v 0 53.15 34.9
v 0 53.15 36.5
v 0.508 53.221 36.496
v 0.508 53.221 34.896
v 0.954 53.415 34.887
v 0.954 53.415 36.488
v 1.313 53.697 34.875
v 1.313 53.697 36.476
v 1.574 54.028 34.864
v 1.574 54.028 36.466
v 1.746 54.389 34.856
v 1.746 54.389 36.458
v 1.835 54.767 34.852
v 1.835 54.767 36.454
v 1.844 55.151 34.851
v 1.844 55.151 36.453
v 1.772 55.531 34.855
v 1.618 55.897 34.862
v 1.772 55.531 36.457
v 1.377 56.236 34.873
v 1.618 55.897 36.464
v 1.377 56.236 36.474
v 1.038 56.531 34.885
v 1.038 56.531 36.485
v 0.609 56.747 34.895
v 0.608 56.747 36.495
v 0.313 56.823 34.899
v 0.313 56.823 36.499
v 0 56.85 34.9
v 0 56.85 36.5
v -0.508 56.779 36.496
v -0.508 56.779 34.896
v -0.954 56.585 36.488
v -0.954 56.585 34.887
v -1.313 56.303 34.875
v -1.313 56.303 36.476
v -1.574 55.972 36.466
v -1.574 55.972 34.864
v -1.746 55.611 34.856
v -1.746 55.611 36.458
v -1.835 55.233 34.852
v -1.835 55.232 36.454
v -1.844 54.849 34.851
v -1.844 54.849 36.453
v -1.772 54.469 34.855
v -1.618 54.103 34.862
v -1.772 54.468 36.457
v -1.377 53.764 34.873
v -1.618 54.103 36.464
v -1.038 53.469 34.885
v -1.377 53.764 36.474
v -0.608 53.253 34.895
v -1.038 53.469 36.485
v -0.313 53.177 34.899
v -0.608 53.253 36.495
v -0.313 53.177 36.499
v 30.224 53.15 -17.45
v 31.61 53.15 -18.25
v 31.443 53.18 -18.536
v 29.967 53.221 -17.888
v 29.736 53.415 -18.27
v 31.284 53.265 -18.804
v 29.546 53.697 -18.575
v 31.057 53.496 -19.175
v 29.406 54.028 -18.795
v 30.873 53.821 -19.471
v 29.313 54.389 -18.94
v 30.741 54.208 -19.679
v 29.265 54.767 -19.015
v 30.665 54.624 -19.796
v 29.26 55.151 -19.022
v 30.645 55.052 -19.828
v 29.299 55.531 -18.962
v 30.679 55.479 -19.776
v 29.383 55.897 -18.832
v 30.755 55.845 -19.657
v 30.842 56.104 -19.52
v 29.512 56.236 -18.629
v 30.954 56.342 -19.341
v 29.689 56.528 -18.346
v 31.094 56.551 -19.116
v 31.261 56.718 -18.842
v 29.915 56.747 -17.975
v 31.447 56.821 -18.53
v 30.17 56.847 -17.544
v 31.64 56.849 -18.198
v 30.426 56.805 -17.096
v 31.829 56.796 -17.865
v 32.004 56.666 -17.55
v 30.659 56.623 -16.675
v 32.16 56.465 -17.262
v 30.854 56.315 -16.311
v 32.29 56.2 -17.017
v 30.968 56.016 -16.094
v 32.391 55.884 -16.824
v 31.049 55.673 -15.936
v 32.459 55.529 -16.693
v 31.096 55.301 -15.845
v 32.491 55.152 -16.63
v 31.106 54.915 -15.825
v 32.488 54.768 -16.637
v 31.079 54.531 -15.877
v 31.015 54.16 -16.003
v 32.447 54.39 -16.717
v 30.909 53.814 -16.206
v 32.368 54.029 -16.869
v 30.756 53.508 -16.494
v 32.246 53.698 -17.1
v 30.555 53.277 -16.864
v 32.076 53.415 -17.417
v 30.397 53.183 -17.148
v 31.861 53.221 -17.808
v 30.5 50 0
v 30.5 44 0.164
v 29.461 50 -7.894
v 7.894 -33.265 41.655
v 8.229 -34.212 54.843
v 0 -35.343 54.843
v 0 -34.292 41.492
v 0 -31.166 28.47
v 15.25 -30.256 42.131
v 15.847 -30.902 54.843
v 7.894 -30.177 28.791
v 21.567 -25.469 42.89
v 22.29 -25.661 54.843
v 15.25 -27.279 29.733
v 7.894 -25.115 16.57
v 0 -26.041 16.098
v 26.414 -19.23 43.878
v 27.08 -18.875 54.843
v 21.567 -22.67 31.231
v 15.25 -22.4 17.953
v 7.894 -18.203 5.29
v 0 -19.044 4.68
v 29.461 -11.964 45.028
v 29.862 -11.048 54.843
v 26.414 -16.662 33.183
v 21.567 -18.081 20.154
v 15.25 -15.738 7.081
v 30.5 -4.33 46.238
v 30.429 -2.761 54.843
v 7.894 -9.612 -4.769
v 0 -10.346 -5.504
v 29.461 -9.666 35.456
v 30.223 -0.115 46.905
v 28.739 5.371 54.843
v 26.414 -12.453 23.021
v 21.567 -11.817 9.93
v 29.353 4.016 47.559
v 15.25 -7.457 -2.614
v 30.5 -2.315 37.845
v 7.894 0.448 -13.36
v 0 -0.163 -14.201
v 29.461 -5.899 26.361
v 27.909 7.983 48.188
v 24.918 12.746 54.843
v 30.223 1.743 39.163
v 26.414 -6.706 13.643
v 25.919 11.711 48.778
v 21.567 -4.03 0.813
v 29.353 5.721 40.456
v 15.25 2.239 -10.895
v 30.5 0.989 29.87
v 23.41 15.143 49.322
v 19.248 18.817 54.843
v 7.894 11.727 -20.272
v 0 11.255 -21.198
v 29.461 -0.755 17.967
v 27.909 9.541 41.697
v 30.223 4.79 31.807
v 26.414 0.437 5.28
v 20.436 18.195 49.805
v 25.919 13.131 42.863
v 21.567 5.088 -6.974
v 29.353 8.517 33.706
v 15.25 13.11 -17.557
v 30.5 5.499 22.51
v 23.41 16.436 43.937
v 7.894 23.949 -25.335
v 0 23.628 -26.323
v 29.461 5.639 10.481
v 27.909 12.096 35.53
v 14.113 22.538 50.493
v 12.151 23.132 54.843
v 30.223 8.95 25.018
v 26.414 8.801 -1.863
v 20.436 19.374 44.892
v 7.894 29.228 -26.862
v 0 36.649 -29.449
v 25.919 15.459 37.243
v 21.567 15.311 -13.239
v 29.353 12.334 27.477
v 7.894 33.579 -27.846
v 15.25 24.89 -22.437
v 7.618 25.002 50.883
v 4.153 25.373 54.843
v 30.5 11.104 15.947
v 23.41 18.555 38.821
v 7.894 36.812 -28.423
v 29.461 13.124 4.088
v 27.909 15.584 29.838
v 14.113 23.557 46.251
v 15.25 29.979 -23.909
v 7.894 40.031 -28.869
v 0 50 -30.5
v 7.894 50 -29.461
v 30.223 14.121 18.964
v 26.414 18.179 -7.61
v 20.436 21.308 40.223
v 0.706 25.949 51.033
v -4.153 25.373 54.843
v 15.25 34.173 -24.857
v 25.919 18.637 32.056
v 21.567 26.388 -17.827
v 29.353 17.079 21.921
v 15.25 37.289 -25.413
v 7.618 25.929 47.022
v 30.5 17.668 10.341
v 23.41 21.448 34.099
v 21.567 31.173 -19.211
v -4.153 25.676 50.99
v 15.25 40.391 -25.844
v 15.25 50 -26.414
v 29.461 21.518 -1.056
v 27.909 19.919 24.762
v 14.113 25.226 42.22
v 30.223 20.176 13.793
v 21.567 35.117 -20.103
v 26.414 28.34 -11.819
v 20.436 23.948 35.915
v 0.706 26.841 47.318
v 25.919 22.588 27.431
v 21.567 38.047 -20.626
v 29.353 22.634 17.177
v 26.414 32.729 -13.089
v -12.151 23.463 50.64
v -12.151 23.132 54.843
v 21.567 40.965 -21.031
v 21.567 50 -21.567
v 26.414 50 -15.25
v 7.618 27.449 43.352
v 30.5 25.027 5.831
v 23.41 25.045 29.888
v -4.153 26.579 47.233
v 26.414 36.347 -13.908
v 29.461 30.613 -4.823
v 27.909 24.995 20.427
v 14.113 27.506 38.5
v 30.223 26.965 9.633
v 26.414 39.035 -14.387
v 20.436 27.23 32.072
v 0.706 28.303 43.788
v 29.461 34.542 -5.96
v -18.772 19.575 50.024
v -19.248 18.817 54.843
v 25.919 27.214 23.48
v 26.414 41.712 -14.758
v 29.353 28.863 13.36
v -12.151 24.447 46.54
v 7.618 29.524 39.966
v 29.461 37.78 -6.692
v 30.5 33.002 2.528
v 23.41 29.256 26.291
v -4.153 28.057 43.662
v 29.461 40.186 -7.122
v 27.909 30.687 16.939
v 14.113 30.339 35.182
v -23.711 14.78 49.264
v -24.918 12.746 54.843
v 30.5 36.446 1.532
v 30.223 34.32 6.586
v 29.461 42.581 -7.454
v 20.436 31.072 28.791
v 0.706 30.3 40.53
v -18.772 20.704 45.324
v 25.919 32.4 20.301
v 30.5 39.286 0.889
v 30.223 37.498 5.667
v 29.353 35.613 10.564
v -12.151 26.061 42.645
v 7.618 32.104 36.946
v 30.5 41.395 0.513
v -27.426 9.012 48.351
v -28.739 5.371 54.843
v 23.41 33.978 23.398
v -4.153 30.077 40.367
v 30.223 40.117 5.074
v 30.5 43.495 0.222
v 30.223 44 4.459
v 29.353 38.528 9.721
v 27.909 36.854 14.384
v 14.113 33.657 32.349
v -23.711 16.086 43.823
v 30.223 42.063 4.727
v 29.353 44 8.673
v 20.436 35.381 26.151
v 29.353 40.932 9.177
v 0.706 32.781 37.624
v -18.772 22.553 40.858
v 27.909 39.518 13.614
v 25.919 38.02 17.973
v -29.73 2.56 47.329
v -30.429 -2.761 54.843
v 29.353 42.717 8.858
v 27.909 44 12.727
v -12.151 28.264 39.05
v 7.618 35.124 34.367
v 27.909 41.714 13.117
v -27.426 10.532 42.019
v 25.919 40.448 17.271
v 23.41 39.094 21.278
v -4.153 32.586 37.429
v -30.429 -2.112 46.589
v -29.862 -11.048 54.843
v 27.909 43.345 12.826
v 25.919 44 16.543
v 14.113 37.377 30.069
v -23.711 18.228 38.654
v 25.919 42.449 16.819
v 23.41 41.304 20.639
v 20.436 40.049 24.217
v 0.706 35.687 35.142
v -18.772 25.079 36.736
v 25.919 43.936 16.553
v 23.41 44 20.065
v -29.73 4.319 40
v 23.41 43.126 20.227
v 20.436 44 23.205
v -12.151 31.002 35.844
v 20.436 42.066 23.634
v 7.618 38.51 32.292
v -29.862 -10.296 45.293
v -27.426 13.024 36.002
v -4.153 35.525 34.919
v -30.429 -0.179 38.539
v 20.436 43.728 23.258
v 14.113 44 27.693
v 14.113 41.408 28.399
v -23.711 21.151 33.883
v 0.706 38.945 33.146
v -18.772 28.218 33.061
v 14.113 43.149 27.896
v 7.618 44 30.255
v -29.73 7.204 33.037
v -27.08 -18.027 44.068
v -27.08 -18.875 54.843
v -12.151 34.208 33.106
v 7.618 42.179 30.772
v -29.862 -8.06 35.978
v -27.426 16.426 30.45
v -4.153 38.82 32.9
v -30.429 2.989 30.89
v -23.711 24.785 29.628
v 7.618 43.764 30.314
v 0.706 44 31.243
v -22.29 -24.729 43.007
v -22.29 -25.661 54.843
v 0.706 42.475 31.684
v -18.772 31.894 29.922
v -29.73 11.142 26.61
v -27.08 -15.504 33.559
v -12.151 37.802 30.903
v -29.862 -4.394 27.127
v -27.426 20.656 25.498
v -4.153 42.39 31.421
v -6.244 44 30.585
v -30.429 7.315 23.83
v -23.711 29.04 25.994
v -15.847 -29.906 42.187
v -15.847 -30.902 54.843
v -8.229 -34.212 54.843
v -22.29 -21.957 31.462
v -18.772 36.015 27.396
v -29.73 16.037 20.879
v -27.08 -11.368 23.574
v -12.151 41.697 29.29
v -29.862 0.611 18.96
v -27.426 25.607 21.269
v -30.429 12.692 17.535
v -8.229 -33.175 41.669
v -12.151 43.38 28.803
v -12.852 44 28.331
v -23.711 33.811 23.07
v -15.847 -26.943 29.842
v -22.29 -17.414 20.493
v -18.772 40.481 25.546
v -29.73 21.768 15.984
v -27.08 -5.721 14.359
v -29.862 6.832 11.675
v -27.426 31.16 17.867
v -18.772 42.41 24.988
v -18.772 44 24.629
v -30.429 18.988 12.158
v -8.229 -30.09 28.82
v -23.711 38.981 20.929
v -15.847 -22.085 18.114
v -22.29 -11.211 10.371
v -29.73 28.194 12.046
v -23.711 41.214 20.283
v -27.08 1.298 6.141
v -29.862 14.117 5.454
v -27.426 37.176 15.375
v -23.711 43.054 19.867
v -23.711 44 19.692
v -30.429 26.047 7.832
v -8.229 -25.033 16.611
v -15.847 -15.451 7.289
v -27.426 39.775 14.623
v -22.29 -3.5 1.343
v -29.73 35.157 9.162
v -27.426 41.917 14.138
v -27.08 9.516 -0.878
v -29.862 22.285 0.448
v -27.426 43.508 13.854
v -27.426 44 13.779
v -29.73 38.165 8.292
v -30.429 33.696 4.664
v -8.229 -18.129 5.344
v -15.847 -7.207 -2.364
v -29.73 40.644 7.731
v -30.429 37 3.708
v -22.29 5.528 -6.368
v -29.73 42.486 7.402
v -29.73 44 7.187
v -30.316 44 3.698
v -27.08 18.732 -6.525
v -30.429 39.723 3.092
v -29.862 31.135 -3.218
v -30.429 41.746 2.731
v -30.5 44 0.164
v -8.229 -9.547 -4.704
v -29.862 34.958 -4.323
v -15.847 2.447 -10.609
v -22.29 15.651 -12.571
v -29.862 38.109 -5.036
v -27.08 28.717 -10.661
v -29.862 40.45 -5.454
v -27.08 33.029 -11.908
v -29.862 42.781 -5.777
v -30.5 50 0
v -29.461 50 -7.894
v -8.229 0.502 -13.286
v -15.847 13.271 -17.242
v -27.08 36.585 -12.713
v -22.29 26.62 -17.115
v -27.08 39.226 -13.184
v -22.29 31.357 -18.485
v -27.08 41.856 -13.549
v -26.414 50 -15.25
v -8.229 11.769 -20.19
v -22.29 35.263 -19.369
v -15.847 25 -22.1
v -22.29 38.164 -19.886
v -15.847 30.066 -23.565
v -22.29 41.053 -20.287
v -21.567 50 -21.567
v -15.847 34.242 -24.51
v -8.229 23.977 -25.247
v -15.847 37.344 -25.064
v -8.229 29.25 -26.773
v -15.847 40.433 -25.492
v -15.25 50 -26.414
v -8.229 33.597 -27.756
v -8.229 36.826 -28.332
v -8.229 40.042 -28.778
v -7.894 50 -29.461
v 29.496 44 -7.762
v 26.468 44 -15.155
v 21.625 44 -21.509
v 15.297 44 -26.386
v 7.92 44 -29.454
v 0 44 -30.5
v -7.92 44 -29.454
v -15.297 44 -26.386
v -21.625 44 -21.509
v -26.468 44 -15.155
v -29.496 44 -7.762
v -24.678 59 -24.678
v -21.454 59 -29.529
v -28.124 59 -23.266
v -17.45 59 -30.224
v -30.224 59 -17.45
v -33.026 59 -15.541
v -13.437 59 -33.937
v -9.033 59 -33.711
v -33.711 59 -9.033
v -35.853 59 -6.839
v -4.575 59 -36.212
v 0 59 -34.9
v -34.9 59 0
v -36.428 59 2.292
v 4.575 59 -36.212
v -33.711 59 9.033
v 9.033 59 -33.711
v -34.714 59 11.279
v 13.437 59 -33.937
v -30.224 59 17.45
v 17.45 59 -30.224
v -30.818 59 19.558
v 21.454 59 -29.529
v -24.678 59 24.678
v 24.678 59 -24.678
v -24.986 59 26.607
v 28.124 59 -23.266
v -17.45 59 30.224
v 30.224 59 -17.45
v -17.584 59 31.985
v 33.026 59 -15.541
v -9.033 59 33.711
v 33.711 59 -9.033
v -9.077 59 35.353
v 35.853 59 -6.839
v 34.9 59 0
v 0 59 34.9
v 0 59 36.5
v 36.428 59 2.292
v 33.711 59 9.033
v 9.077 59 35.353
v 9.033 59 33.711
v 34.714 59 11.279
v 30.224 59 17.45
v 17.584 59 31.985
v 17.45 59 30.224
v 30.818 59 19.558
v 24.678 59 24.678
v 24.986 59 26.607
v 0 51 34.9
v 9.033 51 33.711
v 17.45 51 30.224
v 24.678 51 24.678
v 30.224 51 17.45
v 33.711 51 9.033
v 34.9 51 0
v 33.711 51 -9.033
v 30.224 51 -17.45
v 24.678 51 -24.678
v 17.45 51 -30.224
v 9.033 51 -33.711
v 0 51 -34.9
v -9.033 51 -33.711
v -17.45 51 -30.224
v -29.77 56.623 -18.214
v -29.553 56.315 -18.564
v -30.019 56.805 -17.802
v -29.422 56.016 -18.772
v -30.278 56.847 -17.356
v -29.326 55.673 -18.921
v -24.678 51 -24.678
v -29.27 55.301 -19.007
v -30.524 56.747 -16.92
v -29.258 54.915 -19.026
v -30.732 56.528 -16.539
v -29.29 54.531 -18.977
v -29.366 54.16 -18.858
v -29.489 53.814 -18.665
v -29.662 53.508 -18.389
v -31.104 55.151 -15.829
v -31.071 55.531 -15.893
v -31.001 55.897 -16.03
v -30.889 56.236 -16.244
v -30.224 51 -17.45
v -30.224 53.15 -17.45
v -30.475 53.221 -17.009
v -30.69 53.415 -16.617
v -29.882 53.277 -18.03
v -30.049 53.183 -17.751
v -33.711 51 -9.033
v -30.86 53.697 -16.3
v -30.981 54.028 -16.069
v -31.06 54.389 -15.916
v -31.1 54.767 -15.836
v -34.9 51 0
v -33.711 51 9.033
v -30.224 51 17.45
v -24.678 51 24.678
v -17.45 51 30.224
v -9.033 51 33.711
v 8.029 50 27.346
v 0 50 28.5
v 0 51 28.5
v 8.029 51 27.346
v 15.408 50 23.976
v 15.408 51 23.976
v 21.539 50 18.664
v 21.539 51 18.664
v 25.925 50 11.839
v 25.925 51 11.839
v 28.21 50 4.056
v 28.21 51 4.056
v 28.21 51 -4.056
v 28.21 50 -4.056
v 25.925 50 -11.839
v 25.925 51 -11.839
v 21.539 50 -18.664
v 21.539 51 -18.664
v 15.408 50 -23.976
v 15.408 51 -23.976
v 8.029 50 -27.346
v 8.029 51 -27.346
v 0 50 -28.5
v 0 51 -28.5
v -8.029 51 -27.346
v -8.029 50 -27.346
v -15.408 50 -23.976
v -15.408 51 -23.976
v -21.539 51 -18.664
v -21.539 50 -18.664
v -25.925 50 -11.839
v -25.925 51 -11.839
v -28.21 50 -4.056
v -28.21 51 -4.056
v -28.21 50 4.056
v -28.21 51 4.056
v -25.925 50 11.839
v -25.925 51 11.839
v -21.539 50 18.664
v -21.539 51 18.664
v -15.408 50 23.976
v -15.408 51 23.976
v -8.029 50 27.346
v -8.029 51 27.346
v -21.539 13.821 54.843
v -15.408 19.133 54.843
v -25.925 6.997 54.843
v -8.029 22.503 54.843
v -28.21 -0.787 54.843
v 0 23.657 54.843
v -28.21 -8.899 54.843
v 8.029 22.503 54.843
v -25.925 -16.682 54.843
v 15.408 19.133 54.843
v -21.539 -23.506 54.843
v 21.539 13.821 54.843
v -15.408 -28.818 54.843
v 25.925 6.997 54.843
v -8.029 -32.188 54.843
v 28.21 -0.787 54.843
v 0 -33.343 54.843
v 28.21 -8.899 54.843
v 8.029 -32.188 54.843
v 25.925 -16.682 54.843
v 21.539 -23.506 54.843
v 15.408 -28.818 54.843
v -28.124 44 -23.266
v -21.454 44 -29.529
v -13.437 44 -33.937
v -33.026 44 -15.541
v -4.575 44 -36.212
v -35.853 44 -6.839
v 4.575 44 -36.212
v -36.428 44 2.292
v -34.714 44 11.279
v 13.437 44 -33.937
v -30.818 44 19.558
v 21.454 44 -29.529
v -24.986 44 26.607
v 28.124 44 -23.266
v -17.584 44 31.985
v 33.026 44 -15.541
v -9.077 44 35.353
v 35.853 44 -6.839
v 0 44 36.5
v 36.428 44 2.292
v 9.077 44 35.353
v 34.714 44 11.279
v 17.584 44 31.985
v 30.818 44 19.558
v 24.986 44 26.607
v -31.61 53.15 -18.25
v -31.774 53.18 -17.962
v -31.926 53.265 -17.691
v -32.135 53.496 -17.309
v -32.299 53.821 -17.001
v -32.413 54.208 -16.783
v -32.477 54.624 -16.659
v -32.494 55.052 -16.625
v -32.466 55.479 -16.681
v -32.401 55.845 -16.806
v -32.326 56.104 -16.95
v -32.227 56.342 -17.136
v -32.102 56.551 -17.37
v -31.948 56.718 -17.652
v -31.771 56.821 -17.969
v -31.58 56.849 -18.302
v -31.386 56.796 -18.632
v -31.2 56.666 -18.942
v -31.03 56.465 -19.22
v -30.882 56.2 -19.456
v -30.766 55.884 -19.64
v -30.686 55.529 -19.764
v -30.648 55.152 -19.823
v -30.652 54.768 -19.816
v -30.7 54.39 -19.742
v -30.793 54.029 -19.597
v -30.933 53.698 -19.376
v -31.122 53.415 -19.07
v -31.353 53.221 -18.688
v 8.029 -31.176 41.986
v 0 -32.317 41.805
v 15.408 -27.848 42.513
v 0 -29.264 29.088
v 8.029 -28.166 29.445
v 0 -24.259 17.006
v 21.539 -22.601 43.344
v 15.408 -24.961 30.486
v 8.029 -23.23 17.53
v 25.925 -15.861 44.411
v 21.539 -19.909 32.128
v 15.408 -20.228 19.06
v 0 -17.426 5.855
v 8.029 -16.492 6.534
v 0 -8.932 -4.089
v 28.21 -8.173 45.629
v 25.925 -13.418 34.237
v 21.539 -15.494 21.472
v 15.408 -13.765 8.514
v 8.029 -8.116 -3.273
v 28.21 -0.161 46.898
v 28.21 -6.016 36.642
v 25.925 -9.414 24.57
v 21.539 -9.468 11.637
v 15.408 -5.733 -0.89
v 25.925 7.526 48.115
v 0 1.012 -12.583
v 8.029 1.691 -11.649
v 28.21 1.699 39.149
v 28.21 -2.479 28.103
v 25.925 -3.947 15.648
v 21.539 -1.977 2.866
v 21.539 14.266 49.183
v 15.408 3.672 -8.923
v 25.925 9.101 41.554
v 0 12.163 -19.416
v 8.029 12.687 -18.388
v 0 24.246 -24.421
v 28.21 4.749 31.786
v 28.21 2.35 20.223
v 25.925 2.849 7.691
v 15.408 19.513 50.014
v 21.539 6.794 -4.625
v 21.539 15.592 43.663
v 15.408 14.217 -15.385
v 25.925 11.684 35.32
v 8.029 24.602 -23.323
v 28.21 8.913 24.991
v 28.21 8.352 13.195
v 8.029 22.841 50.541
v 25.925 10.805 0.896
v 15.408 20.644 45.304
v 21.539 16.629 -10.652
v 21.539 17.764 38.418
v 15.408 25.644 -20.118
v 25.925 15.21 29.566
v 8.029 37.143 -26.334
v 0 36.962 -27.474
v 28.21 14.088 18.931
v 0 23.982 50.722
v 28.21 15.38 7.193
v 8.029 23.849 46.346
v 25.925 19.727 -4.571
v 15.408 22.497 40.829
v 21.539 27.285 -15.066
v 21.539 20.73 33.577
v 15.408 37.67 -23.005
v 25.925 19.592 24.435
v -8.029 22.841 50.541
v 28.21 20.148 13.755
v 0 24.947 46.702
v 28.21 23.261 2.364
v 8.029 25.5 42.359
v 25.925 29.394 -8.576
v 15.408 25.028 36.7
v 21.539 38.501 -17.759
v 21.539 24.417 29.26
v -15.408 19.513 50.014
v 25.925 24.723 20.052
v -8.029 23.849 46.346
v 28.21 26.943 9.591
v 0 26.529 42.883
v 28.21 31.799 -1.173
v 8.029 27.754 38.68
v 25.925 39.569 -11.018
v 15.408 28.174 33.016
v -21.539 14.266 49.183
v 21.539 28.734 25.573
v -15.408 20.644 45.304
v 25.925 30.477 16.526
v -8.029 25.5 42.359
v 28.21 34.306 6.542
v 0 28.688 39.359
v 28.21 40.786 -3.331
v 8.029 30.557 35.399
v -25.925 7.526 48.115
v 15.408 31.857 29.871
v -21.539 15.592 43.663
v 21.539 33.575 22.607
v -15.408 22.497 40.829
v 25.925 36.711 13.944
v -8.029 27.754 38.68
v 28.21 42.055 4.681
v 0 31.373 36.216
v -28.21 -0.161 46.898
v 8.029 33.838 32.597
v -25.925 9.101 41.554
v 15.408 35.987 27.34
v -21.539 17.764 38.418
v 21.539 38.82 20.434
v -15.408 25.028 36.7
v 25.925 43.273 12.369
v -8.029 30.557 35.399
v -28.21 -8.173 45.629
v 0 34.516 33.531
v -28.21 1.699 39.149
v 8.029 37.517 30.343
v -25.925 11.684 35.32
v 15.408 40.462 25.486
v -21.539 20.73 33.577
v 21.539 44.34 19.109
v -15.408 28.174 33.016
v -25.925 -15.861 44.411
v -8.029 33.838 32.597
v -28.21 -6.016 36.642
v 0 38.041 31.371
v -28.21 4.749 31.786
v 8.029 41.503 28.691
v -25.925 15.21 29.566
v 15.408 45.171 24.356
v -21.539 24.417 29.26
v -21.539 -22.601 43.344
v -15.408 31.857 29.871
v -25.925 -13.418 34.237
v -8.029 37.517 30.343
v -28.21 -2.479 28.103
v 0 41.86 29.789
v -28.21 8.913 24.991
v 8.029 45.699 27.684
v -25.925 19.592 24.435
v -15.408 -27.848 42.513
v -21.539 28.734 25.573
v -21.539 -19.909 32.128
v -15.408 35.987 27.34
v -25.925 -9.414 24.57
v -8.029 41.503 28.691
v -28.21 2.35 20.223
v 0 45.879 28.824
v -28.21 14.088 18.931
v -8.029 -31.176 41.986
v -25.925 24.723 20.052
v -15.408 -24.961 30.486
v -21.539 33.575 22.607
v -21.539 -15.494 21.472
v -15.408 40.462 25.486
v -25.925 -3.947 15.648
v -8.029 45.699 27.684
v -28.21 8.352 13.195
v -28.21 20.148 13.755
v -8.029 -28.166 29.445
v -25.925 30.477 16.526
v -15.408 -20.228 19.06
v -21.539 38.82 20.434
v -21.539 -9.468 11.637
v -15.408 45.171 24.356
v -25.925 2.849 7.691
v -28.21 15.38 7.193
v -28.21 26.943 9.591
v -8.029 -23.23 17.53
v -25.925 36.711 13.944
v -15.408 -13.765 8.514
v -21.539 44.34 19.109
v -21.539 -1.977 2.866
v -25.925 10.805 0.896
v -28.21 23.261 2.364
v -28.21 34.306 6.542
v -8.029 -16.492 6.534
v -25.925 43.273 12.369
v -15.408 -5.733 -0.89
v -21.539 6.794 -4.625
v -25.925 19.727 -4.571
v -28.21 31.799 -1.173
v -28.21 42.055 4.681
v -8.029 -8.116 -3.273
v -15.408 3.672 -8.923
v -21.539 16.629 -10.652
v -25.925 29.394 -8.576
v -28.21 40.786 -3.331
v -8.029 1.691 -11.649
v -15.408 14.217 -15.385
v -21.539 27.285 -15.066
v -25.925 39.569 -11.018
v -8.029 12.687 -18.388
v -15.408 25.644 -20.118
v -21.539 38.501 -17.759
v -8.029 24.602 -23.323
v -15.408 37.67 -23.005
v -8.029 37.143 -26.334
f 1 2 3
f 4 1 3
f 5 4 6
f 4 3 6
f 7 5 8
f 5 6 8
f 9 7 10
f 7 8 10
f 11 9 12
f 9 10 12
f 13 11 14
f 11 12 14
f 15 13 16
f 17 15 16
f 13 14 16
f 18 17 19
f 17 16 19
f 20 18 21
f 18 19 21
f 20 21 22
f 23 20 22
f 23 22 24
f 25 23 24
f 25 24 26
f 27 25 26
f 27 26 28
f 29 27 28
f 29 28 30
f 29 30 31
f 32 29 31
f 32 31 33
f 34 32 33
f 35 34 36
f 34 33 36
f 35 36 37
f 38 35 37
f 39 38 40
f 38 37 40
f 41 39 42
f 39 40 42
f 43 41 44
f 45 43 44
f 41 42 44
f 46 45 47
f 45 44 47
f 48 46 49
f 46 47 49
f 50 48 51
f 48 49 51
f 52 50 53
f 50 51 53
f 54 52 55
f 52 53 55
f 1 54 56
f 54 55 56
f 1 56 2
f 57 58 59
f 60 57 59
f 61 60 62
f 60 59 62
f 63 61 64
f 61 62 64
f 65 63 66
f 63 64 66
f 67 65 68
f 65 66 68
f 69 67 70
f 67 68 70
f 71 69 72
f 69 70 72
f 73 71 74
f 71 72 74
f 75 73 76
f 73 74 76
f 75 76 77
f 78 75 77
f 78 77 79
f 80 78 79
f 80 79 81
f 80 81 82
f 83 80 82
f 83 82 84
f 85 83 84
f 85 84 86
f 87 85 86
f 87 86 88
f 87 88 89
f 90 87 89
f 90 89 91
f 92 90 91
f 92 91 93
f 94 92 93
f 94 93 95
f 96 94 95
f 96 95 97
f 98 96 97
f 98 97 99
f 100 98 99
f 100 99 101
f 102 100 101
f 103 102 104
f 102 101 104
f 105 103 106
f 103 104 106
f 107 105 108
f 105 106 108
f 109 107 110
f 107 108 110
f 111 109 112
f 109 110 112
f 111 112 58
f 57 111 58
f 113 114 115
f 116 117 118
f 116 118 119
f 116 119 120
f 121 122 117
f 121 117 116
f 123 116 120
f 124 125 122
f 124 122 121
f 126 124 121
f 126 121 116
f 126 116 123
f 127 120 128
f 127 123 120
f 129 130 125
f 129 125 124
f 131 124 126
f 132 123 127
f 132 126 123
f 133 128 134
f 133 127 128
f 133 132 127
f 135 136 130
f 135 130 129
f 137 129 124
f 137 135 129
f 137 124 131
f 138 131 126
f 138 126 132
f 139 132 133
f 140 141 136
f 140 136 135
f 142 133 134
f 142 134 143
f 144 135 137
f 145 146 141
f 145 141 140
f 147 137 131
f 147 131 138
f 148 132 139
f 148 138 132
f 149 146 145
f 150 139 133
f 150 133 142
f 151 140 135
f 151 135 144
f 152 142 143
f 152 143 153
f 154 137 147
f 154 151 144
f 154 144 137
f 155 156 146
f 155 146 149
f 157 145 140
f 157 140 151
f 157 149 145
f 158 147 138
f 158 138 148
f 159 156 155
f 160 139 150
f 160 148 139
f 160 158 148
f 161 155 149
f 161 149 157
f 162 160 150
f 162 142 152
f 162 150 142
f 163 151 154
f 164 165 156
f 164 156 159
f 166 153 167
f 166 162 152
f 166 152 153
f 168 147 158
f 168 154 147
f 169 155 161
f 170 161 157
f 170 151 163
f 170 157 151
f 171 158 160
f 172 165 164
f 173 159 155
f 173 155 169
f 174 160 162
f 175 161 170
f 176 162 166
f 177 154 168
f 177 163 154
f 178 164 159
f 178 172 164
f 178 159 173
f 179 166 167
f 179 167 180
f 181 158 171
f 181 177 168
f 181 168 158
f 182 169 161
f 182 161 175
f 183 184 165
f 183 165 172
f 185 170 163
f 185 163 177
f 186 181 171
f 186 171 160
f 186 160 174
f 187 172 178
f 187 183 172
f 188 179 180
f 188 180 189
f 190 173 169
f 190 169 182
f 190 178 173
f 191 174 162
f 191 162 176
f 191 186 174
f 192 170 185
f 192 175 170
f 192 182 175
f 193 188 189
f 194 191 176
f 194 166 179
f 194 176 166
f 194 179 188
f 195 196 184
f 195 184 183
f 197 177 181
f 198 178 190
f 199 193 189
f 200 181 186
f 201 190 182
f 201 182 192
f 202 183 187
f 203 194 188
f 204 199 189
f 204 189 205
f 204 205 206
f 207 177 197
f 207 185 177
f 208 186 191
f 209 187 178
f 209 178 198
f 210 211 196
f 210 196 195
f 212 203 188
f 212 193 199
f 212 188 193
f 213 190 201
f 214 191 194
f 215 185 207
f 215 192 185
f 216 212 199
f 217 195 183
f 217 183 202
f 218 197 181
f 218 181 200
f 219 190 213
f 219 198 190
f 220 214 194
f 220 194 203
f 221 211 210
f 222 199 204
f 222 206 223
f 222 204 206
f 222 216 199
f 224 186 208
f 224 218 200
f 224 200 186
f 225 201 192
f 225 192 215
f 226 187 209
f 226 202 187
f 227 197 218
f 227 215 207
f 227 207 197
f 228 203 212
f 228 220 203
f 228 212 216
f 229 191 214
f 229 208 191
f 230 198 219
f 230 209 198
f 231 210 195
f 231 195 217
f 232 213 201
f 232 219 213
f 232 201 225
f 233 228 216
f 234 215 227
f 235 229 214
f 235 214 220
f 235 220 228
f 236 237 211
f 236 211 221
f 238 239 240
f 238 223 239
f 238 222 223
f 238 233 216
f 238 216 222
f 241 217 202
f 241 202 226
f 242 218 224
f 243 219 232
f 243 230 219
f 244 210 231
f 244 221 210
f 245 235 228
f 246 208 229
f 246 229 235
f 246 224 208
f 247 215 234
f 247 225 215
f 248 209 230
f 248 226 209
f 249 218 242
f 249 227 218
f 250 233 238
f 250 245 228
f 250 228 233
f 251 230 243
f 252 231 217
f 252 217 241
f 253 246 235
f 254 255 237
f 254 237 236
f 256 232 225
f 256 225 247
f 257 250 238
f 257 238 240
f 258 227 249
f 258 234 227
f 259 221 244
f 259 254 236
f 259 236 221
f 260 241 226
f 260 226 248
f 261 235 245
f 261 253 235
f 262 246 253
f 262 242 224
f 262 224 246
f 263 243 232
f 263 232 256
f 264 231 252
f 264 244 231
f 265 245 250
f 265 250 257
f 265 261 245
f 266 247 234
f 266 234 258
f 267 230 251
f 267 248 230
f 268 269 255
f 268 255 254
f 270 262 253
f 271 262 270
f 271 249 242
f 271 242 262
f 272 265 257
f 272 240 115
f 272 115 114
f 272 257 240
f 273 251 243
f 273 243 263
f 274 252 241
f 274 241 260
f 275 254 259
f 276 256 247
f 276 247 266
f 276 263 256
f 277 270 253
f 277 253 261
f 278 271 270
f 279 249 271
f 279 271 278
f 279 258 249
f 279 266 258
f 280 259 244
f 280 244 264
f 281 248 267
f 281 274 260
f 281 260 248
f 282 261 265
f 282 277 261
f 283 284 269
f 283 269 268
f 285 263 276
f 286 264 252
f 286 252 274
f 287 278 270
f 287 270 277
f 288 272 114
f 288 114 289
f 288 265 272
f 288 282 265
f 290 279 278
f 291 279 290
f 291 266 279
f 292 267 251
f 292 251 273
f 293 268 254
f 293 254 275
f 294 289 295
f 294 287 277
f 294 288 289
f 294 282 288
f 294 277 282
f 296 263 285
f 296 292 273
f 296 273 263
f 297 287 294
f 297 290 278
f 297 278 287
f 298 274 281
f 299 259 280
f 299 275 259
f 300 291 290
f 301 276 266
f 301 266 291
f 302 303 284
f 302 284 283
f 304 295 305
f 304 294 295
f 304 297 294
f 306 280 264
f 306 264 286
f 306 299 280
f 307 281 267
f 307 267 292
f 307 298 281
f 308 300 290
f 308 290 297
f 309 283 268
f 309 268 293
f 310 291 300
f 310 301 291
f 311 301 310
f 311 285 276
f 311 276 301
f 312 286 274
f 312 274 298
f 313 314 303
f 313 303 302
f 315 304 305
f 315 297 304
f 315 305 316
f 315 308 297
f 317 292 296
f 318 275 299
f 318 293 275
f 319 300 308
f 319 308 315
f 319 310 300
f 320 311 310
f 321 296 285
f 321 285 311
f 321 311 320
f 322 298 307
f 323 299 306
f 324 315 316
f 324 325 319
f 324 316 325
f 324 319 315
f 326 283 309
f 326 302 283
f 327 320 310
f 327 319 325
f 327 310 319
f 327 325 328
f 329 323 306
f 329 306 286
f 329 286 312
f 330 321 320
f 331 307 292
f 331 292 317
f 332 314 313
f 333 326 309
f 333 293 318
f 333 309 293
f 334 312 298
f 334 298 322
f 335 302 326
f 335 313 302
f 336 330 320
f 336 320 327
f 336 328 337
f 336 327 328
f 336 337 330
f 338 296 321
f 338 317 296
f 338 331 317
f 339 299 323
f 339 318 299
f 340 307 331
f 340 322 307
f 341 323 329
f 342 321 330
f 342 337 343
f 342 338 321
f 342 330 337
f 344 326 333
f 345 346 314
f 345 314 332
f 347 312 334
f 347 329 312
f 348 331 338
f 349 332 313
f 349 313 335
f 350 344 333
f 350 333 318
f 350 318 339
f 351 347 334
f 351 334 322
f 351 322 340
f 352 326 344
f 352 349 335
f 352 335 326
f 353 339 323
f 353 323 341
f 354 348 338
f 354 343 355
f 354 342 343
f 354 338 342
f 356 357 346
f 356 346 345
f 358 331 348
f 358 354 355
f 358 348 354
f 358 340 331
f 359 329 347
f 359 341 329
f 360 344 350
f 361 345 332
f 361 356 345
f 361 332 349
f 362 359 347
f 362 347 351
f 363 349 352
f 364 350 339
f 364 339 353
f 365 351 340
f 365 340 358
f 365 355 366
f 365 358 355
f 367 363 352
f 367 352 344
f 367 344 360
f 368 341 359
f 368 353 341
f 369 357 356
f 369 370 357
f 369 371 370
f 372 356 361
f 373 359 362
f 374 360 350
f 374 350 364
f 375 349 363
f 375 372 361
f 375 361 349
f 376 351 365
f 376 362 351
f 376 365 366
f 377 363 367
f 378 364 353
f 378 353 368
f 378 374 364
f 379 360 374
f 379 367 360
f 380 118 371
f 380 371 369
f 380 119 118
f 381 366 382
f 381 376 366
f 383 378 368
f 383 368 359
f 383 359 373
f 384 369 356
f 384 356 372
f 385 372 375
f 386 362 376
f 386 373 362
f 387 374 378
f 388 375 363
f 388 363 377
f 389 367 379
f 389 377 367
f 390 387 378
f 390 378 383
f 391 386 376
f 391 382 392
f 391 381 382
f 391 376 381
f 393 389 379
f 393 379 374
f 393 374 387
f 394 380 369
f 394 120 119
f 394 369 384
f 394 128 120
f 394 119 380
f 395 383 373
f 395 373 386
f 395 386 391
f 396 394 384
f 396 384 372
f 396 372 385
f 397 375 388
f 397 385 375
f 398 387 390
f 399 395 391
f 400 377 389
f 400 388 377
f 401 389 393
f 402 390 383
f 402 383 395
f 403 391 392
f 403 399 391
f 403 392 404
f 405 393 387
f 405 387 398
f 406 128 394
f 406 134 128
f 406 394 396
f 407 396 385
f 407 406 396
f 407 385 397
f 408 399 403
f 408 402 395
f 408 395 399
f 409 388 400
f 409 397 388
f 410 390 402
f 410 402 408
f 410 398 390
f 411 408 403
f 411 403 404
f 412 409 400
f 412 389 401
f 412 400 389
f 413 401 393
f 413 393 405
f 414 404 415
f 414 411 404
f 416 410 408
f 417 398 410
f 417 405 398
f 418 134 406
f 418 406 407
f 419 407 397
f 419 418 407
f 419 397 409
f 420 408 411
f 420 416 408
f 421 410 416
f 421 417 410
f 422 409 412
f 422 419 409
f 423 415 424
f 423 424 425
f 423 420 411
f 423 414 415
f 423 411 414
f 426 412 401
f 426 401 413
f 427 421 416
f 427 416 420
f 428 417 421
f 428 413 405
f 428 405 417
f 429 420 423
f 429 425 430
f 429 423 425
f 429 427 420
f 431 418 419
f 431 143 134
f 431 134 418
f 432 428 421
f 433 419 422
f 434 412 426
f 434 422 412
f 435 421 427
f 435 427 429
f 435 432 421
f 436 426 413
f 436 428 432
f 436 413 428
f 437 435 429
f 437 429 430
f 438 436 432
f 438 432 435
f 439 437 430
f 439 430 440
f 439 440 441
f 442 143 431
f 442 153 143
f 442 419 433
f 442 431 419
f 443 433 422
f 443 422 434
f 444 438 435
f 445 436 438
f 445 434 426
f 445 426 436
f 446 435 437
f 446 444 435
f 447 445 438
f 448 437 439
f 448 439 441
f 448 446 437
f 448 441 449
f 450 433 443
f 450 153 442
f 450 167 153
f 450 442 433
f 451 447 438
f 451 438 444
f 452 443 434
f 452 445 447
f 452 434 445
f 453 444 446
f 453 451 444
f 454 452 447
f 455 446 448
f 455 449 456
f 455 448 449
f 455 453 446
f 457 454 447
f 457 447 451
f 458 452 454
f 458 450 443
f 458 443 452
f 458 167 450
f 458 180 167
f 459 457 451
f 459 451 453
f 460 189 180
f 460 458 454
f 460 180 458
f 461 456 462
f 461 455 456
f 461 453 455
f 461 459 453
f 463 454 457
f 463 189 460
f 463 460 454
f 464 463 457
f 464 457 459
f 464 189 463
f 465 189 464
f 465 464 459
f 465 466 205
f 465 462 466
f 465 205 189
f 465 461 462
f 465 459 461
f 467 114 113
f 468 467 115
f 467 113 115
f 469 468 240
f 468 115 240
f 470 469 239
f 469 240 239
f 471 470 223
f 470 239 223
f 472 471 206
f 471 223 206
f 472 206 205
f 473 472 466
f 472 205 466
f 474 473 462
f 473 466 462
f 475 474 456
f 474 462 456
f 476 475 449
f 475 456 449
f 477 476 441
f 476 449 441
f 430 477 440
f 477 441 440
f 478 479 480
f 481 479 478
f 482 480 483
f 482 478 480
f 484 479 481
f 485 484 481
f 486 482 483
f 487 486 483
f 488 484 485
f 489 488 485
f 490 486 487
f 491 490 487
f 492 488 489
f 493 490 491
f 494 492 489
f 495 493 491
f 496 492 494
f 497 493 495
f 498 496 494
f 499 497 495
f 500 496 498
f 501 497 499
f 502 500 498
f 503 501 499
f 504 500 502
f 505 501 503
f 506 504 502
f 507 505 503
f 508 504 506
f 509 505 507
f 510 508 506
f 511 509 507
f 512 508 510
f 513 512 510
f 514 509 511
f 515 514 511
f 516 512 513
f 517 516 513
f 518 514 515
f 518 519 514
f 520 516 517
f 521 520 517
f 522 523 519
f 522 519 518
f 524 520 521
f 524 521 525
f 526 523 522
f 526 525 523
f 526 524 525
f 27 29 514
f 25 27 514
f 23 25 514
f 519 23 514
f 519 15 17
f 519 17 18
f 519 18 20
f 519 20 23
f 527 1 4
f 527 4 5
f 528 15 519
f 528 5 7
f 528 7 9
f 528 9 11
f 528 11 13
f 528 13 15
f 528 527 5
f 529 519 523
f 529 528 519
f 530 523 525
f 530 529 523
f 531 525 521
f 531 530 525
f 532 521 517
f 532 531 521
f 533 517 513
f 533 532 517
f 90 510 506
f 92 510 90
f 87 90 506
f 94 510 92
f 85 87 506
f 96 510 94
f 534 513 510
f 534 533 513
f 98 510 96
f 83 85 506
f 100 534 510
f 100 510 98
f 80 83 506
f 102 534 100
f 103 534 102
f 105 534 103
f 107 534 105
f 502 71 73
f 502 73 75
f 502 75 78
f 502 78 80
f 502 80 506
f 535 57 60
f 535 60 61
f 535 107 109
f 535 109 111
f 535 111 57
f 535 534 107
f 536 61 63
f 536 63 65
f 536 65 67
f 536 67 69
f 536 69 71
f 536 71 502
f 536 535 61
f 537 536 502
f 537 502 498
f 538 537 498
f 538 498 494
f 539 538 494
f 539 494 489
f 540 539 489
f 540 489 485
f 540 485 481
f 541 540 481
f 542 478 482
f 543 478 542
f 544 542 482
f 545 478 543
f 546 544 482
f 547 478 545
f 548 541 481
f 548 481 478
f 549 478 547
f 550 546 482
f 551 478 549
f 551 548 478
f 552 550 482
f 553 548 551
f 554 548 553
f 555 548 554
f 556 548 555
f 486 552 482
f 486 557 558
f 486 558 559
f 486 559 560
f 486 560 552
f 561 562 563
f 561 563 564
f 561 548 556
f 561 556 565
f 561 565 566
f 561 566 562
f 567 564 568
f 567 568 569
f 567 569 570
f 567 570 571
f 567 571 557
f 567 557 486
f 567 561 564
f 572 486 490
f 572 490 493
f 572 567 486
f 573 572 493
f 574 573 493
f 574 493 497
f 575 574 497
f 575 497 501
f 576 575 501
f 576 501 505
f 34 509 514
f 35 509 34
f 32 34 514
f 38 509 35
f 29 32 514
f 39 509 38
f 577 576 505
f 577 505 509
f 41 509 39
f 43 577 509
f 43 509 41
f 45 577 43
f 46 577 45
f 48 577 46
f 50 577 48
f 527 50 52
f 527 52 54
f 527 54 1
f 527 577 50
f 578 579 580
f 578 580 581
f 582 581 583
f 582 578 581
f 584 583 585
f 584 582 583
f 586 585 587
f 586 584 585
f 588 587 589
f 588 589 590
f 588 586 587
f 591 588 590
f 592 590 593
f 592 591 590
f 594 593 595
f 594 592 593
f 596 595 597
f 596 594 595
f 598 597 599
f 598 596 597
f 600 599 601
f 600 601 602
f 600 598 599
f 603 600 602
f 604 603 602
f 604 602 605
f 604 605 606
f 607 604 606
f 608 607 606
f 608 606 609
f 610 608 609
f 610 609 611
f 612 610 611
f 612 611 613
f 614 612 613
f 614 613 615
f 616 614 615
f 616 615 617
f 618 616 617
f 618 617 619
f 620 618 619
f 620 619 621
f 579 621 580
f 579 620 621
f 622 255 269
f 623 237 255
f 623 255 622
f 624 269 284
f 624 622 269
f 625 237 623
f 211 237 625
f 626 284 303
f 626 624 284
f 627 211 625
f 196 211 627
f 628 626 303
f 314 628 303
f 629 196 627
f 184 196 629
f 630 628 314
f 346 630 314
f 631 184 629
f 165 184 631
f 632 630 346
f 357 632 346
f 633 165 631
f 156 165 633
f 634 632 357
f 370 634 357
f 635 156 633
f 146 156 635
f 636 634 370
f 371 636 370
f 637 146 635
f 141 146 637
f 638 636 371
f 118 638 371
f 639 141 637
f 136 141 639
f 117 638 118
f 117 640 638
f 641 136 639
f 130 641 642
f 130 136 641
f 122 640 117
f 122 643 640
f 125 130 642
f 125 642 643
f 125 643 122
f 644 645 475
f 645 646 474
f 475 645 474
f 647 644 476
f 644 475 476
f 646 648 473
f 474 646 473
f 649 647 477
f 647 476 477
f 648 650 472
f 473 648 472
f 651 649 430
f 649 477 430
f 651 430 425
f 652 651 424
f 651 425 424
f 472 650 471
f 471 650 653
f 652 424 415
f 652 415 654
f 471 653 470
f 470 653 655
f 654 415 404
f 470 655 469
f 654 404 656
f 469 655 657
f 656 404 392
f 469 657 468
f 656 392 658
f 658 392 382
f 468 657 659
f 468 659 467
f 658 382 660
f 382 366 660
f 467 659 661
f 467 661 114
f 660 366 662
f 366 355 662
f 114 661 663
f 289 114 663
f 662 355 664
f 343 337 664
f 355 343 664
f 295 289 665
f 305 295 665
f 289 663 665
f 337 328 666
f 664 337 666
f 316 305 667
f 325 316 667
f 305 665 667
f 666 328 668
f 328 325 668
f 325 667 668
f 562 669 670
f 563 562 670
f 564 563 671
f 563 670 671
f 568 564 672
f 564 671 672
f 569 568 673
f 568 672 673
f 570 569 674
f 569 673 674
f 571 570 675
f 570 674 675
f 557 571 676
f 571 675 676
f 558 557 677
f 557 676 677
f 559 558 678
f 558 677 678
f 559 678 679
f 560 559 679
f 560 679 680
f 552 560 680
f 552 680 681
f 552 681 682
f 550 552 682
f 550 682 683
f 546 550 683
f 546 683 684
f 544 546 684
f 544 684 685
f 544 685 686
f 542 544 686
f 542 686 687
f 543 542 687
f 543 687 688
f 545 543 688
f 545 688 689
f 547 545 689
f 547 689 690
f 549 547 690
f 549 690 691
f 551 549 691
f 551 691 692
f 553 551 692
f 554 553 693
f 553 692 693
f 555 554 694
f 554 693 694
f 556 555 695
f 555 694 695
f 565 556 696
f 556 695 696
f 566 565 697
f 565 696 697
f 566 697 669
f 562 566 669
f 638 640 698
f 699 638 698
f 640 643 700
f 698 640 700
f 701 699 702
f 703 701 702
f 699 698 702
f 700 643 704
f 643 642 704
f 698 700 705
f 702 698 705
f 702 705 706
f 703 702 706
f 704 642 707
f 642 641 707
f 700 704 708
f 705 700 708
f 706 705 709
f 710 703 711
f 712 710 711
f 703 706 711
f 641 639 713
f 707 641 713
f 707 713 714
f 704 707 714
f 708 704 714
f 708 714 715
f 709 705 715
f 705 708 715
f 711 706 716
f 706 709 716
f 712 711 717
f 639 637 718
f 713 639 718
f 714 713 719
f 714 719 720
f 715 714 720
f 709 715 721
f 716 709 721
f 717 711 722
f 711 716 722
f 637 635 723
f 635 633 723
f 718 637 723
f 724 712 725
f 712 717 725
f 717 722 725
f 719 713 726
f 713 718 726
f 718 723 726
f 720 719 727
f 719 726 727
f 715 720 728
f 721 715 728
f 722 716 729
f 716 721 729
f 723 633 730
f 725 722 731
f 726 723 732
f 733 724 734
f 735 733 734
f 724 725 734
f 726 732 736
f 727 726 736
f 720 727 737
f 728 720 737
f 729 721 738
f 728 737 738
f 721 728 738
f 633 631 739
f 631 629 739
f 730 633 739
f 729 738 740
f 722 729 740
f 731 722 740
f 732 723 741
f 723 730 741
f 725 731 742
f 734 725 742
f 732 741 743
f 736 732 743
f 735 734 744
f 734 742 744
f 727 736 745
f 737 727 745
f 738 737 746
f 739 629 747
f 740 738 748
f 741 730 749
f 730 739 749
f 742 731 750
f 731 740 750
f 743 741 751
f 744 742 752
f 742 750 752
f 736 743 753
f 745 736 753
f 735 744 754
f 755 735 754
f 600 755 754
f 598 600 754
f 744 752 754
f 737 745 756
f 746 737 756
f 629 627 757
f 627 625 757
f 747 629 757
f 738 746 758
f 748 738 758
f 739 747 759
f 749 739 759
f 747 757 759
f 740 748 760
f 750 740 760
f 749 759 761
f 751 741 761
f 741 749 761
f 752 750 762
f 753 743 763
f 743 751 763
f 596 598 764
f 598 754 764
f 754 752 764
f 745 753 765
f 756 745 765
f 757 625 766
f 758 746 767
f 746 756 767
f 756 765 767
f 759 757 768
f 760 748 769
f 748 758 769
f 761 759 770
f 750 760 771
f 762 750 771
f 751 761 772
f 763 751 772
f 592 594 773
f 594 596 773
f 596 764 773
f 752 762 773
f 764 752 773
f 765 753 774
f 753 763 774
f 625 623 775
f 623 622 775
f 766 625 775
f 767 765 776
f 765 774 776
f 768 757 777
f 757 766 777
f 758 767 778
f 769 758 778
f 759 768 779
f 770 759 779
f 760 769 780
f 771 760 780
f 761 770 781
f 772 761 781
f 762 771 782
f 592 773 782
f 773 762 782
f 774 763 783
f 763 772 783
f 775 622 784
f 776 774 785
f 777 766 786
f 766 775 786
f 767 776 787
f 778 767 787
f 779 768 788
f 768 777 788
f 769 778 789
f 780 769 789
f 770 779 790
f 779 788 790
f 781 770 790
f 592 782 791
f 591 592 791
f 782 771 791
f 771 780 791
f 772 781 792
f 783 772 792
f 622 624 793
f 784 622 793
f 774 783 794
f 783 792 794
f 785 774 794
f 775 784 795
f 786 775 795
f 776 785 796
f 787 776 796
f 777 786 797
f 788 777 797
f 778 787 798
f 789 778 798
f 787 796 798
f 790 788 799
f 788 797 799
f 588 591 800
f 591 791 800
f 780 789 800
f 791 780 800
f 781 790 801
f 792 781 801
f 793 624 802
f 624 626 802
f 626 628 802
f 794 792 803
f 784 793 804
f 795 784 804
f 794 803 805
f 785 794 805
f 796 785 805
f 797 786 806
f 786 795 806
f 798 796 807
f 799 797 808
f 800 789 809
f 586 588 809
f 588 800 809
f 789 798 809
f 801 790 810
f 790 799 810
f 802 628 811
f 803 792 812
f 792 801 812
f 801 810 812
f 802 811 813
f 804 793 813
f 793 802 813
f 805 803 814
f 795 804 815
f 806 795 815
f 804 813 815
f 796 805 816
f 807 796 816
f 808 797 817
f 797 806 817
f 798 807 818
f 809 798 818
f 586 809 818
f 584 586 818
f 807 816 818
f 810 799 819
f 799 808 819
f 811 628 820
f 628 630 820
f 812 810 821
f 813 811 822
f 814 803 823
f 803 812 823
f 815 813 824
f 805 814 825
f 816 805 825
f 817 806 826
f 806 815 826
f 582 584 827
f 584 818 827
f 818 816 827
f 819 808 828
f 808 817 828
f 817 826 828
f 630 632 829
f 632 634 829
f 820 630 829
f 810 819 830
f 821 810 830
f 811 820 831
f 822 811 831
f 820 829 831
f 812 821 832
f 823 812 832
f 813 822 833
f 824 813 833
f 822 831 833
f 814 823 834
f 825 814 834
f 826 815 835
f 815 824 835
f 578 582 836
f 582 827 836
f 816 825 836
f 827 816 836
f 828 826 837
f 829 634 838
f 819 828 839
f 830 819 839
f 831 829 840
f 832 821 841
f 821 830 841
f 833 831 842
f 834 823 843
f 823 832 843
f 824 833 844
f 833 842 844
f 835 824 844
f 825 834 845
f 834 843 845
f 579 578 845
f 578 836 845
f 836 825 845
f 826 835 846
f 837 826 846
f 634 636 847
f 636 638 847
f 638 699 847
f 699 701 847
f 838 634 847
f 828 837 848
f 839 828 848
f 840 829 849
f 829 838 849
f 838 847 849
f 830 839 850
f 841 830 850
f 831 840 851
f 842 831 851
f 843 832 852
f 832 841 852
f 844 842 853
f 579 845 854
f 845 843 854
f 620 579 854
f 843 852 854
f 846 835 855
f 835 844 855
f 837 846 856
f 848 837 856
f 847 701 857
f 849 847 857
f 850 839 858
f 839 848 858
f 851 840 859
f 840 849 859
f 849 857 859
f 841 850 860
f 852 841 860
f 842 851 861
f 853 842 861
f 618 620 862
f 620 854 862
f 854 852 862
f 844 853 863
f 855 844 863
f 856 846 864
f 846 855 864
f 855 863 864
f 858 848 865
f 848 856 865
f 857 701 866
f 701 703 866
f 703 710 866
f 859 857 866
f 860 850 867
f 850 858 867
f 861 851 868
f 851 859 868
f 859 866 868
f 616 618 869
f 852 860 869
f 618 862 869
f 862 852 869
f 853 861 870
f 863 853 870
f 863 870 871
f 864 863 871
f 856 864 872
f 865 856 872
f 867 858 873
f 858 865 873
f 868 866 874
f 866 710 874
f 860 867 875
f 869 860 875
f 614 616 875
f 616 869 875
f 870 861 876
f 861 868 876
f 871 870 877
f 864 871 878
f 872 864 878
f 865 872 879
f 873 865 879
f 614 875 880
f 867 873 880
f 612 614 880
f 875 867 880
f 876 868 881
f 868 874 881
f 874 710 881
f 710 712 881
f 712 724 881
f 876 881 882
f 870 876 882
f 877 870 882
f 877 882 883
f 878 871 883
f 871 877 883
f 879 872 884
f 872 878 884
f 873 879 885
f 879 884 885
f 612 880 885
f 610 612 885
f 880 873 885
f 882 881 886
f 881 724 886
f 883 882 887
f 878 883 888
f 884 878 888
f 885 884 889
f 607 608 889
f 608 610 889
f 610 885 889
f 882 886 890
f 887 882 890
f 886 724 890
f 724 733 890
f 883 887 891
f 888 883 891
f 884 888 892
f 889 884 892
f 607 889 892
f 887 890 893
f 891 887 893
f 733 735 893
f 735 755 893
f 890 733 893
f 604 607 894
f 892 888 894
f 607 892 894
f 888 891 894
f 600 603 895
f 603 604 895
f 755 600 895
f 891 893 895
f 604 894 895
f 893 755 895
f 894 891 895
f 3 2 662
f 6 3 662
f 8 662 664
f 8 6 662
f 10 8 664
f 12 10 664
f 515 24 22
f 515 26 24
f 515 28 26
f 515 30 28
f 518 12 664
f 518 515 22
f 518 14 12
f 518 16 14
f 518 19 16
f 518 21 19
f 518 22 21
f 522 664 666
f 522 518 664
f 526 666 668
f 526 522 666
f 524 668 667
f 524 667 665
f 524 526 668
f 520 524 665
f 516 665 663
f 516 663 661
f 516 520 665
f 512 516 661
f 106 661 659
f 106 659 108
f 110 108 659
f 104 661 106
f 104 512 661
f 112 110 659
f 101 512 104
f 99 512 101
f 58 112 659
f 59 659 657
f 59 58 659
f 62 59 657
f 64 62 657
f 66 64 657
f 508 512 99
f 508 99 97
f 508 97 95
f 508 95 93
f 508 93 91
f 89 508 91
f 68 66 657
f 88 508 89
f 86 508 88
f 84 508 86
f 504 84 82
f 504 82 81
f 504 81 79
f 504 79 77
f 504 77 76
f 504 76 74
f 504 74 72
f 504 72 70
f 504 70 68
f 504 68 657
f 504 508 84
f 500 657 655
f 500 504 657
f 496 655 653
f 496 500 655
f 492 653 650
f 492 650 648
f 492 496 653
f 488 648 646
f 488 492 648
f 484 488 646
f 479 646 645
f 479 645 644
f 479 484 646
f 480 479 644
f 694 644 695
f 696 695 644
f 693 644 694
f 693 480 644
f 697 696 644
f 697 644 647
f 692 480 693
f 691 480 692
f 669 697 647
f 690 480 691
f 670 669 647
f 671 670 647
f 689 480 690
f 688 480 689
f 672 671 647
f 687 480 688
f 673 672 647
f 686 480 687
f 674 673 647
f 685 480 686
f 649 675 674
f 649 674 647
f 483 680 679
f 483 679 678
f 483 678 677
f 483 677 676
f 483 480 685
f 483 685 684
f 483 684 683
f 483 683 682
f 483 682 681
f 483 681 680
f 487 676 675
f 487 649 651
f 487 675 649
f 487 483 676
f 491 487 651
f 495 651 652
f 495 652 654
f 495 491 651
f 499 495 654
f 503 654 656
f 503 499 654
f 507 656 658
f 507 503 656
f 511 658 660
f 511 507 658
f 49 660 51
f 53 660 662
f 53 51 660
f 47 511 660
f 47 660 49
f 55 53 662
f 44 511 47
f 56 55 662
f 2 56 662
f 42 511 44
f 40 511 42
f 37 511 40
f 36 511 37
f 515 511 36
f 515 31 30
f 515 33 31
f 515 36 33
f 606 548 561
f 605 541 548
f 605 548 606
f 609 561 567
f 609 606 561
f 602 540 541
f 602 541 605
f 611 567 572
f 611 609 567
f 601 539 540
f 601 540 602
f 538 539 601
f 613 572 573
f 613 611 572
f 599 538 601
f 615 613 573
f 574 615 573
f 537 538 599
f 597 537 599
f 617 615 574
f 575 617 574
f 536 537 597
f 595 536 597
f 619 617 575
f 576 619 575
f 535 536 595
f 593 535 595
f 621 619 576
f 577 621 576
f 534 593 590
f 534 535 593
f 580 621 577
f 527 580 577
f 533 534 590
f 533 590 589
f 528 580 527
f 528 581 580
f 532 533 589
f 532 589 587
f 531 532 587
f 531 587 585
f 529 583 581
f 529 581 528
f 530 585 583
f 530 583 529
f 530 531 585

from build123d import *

# Parameters (mm, degrees)
SKETCH2_R           = 30.5
SKETCH2_R_2         = 28.5
BOSS_EXTRUDE2_DEPTH = 1
SKETCH7_R           = 36.5
SKETCH7_R_2         = 30.5
SKETCH7_R_3         = 34.9
BOSS_EXTRUDE3_DEPTH = 7
SKETCH7_3_R         = 36.5
SKETCH7_3_R_2       = 34.9
BOSS_EXTRUDE5_DEPTH = 8
SKETCH14_R          = 1.85
CUT_EXTRUDE1_DEPTH  = 8
CIRPATTERN1_COUNT   = 3
SWEEP1_OUTLINE_R    = 30.5
SWEEP1_OUTLINE_R_2  = 28.5
SWEEP1_ANGLE        = 90


# Read off the part's stored shape, not the designer's step: Sweep1
with BuildPart() as part:
    # Sketch2 → Boss-Extrude2 (new body)
    with BuildSketch(Plane(origin=(0, 50, 0), x_dir=(1, 0, 0), z_dir=(0, 1, 0))):
        with Locations(Location((0, 0, 0), (0, 0, 270))):
            Circle(SKETCH2_R)
        with Locations(Location((0, 0, 0), (0, 0, 270))):
            Circle(SKETCH2_R_2, mode=Mode.SUBTRACT)
    extrude(amount=BOSS_EXTRUDE2_DEPTH)



with BuildPart() as body_2:
    # Sketch7 → Boss-Extrude3 (new body)
    # profile 1 of 2: a face of its own
    with BuildSketch(Plane(origin=(0, 51, 0), x_dir=(1, 0, 0), z_dir=(0, 1, 0))):
        with Locations(Location((0, 0, 0), (0, 0, 270))):
            Circle(SKETCH7_R)
        with Locations(Location((0, 0, 0), (0, 0, 270))):
            Circle(SKETCH7_R_2, mode=Mode.SUBTRACT)
    # profile 2 of 2: a face of its own
    with BuildSketch(Plane(origin=(0, 51, 0), x_dir=(1, 0, 0), z_dir=(0, 1, 0))):
        with Locations(Location((0, 0, 0), (0, 0, 270))):
            Circle(SKETCH7_R)
        Circle(SKETCH7_R_3, mode=Mode.SUBTRACT)
    extrude(amount=-BOSS_EXTRUDE3_DEPTH)


with BuildPart() as part_1:
    add(part.part)

    add(body_2.part)  # Boss-Extrude5 merges body 2
    # Sketch7<3> → Boss-Extrude5 (add)
    with BuildSketch(Plane(origin=(0, 51, 0), x_dir=(1, 0, 0), z_dir=(0, 1, 0))):
        with Locations(Location((0, 0, 0), (0, 0, 270))):
            Circle(SKETCH7_3_R)
        with Locations(Location((0, 0, 0), (0, 0, 270))):
            Circle(SKETCH7_3_R_2, mode=Mode.SUBTRACT)
    extrude(amount=BOSS_EXTRUDE5_DEPTH)

    # Sketch14 → Cut-Extrude1 (cut)
    with BuildSketch(Plane.XY.offset(36.5)):
        with Locations(Location((0, 55, 0), (0, 0, 270))):
            Circle(SKETCH14_R)
    cut_extrude1 = extrude(amount=-CUT_EXTRUDE1_DEPTH, mode=Mode.SUBTRACT)

    # CirPattern1: Cut-Extrude1 ×3 about axis
    cirpattern1_axis = Axis((0, 0, 0), (0, 1, 0))
    for i in range(1, CIRPATTERN1_COUNT):
        add(cut_extrude1.rotate(cirpattern1_axis, i * 360 / CIRPATTERN1_COUNT), mode=Mode.SUBTRACT)

    # Sweep1 outline → Sweep1 (revolve)
    with BuildSketch(Plane(origin=(0, 50, 54.842660898), x_dir=(0, -1, 0), z_dir=(0, 0, 1))):
        with Locations((54.842660898, 0)):
            Circle(SWEEP1_OUTLINE_R)
        with Locations((54.842660898, 0)):
            Circle(SWEEP1_OUTLINE_R_2, mode=Mode.SUBTRACT)
    revolve(axis=Axis((0, 50, 54.842660898), (1, 0, 0)), revolution_arc=SWEEP1_ANGLE)


solid = part_1.part
